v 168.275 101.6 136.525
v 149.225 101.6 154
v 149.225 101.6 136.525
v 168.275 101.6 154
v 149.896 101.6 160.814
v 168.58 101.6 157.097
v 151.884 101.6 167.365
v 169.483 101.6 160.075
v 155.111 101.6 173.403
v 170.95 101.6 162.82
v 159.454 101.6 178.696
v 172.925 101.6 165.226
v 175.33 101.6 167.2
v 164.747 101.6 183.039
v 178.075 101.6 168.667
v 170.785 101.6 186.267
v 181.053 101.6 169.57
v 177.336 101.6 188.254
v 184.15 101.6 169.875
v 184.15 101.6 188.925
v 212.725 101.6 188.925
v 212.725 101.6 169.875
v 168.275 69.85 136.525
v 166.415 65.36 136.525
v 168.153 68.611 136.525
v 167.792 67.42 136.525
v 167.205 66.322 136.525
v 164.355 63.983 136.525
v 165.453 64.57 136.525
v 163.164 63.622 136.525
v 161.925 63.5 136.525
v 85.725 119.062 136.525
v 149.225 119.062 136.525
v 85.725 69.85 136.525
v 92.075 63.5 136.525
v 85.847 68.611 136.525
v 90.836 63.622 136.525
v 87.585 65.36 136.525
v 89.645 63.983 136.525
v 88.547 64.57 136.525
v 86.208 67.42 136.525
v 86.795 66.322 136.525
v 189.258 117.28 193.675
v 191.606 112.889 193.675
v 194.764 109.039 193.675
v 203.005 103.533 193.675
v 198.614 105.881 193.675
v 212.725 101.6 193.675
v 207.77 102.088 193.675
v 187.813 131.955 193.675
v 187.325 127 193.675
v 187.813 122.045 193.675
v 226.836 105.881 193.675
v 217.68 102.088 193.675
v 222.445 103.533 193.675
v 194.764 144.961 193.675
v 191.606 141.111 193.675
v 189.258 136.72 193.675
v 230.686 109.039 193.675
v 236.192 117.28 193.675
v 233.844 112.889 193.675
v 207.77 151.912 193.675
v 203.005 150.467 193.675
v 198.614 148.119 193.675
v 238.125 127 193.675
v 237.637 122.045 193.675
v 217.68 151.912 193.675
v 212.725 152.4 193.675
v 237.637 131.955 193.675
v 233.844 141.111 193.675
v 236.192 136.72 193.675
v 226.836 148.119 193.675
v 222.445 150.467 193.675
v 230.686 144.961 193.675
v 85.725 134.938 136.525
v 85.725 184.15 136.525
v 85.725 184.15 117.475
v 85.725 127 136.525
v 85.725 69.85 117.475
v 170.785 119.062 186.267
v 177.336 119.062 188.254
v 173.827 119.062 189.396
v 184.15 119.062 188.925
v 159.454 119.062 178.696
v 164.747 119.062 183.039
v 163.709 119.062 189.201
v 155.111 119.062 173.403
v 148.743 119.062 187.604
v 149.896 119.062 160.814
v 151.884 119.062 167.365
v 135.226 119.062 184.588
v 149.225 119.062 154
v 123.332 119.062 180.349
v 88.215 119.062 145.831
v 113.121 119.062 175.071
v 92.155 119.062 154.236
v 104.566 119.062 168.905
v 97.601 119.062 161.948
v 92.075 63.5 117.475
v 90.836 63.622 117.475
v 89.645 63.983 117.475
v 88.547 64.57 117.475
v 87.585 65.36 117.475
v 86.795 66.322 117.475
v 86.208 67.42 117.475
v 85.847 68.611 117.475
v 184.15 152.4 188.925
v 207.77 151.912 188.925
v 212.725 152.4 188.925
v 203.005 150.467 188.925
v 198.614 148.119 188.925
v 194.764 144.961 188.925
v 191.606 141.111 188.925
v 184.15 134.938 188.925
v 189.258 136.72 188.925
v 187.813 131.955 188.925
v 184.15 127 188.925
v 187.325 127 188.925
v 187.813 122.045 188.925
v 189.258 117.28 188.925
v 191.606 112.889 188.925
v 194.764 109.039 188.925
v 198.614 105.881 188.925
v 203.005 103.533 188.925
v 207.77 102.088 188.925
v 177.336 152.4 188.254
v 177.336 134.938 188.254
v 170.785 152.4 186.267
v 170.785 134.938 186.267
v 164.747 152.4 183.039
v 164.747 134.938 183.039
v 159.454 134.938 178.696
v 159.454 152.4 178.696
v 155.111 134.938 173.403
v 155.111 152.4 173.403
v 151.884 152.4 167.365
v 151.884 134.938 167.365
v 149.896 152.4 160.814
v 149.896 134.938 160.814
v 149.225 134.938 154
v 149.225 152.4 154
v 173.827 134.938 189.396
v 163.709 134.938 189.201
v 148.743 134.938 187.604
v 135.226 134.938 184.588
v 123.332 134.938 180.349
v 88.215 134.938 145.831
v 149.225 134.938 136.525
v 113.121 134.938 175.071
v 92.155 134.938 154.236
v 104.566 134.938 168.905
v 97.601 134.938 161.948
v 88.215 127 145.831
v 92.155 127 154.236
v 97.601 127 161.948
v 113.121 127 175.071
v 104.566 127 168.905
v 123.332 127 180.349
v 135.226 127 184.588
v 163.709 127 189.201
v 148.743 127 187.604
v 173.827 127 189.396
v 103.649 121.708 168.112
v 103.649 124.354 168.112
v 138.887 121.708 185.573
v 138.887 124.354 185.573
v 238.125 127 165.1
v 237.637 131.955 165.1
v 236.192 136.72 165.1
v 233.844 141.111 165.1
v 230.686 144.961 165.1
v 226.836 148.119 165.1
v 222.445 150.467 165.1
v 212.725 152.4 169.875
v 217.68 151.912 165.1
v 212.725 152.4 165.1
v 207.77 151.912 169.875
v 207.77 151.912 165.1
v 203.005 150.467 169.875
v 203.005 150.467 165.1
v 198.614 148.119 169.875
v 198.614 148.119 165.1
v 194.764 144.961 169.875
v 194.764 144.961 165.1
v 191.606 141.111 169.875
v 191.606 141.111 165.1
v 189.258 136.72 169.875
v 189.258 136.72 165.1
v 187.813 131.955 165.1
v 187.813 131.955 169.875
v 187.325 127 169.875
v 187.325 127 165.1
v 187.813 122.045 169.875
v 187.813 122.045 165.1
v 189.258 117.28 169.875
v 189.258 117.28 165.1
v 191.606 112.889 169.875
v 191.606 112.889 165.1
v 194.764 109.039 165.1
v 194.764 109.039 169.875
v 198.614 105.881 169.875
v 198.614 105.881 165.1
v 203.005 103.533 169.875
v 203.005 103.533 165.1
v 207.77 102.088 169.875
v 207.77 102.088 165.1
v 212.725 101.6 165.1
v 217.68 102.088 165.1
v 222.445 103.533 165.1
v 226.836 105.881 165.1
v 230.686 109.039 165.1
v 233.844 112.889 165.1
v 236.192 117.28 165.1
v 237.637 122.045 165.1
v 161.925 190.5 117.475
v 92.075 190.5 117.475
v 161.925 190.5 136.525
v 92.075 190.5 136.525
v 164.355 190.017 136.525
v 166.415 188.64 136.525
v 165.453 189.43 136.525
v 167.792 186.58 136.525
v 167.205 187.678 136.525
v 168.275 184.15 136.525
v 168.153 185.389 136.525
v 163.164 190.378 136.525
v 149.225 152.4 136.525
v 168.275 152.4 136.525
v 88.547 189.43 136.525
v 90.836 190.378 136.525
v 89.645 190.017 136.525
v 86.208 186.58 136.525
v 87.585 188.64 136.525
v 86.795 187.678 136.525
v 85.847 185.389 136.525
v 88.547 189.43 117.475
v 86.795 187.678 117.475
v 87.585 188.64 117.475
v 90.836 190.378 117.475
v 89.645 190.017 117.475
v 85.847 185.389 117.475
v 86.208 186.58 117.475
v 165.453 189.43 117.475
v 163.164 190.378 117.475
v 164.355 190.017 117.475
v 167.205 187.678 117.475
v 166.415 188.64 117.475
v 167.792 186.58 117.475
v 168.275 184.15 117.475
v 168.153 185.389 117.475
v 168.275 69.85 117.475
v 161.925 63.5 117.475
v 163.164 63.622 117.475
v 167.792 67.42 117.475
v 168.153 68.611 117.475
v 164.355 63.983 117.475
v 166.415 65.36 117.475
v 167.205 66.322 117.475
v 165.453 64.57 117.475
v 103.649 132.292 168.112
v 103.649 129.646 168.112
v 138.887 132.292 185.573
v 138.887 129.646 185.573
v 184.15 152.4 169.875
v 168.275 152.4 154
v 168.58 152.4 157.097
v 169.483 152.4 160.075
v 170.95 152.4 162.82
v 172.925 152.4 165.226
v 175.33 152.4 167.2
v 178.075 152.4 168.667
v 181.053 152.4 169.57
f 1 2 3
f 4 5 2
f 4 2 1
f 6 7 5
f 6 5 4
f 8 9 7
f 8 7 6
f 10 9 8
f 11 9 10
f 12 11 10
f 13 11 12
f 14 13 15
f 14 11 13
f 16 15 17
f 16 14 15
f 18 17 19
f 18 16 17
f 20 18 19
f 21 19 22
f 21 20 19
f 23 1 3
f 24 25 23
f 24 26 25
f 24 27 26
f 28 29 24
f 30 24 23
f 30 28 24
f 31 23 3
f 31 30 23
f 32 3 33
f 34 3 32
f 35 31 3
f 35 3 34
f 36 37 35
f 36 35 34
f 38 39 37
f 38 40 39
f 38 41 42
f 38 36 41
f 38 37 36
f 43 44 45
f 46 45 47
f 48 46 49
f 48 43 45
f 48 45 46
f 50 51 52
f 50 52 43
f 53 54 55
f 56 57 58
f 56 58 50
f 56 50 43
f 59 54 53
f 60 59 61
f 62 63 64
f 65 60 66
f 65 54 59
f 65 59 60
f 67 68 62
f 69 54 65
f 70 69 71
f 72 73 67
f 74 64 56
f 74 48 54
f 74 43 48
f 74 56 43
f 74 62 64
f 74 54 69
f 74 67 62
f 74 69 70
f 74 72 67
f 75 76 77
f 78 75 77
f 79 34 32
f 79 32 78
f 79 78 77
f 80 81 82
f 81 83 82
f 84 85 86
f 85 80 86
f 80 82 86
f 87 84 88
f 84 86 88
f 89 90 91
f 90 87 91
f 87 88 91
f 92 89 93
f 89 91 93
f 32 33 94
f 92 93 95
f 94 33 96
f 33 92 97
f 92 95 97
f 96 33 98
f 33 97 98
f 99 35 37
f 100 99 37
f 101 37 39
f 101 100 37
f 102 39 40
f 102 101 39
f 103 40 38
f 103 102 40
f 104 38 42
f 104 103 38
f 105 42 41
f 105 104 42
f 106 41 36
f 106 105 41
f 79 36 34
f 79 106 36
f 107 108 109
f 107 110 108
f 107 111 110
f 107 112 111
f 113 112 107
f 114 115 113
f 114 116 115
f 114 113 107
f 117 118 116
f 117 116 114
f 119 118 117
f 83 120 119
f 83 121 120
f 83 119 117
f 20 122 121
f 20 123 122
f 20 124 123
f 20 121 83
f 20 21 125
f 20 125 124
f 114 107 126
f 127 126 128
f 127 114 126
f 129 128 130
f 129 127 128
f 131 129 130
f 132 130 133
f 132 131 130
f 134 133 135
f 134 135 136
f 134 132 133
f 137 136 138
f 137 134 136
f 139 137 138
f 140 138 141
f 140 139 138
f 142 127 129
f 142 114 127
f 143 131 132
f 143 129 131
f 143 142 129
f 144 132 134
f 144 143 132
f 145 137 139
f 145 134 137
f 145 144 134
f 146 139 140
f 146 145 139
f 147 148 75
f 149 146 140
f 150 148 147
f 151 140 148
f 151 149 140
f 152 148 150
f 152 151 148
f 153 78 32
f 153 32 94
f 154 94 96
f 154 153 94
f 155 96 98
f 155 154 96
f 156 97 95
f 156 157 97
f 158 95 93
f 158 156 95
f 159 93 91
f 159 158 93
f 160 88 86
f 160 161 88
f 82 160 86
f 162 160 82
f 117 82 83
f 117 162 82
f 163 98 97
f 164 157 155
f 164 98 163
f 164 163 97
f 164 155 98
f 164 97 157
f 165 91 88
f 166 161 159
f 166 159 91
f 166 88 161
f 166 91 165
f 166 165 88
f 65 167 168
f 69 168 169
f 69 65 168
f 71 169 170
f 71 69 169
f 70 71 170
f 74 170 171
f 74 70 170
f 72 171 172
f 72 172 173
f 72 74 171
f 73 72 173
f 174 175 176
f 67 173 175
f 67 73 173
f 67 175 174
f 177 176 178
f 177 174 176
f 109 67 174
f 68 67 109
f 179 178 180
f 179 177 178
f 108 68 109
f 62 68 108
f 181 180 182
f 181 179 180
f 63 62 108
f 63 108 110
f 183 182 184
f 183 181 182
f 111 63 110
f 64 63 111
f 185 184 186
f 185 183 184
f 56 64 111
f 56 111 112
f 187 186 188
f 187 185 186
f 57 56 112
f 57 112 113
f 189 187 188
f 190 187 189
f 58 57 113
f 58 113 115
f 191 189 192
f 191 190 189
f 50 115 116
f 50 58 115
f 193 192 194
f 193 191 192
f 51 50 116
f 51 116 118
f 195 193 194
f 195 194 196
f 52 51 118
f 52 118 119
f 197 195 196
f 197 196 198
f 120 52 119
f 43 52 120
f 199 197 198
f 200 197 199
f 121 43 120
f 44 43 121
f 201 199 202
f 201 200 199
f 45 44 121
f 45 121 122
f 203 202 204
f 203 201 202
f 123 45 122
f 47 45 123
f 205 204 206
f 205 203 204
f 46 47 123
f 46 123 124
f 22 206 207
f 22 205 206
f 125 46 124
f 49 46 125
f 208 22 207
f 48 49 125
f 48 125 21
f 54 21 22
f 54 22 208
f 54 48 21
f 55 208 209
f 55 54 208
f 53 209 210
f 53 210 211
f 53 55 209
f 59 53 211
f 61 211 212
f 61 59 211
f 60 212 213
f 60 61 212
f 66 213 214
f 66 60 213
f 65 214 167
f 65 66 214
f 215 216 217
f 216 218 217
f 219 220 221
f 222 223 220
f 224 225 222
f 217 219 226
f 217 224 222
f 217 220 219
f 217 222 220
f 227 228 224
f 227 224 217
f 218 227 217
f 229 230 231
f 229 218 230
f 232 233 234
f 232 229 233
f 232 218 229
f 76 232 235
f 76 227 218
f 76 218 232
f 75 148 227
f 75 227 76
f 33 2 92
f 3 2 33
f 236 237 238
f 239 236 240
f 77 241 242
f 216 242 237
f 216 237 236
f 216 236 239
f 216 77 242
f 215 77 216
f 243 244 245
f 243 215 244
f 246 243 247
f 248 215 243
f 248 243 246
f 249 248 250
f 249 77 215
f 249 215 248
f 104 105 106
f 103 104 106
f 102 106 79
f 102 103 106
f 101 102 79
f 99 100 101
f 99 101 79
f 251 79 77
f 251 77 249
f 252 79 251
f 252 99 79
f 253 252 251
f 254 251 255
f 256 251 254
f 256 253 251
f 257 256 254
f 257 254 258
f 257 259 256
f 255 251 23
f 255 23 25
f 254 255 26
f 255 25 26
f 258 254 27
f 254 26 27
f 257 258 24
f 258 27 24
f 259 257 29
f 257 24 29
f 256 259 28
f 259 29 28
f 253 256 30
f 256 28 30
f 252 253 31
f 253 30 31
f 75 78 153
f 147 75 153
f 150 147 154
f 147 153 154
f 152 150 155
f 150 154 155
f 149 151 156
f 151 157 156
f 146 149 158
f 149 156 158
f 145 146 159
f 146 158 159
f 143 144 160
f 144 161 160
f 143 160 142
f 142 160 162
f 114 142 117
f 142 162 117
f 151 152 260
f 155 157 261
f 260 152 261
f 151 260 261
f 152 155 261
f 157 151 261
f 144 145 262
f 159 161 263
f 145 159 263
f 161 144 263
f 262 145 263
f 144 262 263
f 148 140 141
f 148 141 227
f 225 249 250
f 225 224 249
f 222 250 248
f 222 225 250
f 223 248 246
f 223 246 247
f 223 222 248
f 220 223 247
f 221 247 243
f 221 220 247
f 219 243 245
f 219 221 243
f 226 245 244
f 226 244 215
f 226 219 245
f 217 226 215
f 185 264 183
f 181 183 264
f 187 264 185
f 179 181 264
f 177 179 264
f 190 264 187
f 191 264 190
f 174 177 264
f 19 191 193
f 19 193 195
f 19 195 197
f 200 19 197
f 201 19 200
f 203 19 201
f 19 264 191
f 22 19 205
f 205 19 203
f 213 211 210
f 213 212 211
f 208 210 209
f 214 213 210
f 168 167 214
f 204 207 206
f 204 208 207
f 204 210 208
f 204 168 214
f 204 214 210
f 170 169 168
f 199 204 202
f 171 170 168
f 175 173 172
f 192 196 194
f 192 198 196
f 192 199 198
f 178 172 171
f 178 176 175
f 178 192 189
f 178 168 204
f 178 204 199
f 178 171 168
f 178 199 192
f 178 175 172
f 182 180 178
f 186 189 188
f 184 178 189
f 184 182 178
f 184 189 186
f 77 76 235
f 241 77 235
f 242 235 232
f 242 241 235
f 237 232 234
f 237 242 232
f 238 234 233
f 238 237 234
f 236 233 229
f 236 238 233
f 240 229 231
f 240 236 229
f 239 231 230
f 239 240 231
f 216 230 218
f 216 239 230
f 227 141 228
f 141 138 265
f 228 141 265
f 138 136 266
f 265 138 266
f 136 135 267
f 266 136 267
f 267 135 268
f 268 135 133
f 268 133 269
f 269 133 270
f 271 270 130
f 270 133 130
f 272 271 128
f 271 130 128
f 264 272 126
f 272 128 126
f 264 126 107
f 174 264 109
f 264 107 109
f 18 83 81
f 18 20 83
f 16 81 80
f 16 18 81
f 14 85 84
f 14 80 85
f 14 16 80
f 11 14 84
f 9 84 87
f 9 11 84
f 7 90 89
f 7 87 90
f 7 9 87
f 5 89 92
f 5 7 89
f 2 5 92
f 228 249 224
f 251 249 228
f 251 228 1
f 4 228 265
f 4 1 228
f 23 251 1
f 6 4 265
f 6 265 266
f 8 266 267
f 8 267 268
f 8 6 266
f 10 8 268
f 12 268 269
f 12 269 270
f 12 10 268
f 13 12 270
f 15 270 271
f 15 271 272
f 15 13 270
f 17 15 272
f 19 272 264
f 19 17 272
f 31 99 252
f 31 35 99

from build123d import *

# Parameters (mm, degrees)
F1_DEPTH = 63.5
F0_W     = 25.4
F0_H     = 19.05
F2_DEPTH = 25.4
F3_DEPTH = 7.9375
F5_R     = 6.35


with BuildPart() as f1:
    # F0 (on Front) → F1 (new body, symmetric)
    with BuildSketch(Plane.XZ):
        Polygon((22.225, 9.525), (-41.275, 9.525), (-41.275, -9.525), (41.275, -9.525), (41.275, 9.525), align=None)
    extrude(amount=F1_DEPTH, both=True)

    # F0 (on Front) → F2 (join, symmetric)
    with BuildSketch(Plane.XZ):
        with BuildLine():
            Line((22.225, 27.0002), (22.225, 9.525))
            Line((22.225, 9.525), (41.275, 9.525))
            Line((41.275, 9.525), (41.275, 27.0002))
            ThreePointArc((41.275, 27.0002), (45.9246798487, 38.2255201513), (57.15, 42.8752))
            Line((57.15, 42.8752), (60.325, 42.8752))
            Line((60.325, 42.8752), (60.325, 61.9252))
            Line((60.325, 61.9252), (57.15, 61.9252))
            ThreePointArc((57.15, 61.9252), (32.4542956671, 51.6959043329), (22.225, 27.0002))
        make_face()
        with Locations((73.025, 52.4002)):
            Rectangle(F0_W, F0_H)
    extrude(amount=F2_DEPTH, both=True)

    # F0 (on Front) → F3 (join, symmetric)
    with BuildSketch(Plane.XZ):
        with BuildLine():
            add(Edge.make_bspline(
                [(-41.275, 9.525), (-34.4362333417, 48.1805466115), (9.3027921394, 65.6224936247), (57.15, 61.9252)],
                knots=[0, 0, 0, 0, 111.5045361635, 111.5045361635, 111.5045361635, 111.5045361635], degree=3))
            Line((-41.275, 9.525), (22.225, 9.525))
            Line((22.225, 9.525), (22.225, 27.0002))
            ThreePointArc((22.225, 27.0002), (32.4542956671, 51.6959043329), (57.15, 61.9252))
        make_face()
    extrude(amount=F3_DEPTH, both=True)

    # F0 (on Front) → F4 (revolve)
    with BuildSketch(Plane.XZ):
        Polygon((85.725, 66.675), (85.725, 61.9252), (85.725, 42.8752), (85.725, 38.1), (111.125, 38.1), (111.125, 66.675), align=None)
    revolve(axis=Axis((85.725, 0, 52.3875), (0, 0, 1)))

    # F5
    f5_edges = [f1.edges().sort_by_distance(p)[0] for p in [
        (-41.275, -63.5, 0),
        (41.275, -63.5, 0),
        (41.275, 63.5, 0),
        (-41.275, 63.5, 0),
    ]]
    fillet(f5_edges, radius=F5_R)


with BuildPart() as f6_1:
    # F6: copy of F1
    add(f1.part.moved(Location((127, 127, 127))))


solid = f6_1.part
